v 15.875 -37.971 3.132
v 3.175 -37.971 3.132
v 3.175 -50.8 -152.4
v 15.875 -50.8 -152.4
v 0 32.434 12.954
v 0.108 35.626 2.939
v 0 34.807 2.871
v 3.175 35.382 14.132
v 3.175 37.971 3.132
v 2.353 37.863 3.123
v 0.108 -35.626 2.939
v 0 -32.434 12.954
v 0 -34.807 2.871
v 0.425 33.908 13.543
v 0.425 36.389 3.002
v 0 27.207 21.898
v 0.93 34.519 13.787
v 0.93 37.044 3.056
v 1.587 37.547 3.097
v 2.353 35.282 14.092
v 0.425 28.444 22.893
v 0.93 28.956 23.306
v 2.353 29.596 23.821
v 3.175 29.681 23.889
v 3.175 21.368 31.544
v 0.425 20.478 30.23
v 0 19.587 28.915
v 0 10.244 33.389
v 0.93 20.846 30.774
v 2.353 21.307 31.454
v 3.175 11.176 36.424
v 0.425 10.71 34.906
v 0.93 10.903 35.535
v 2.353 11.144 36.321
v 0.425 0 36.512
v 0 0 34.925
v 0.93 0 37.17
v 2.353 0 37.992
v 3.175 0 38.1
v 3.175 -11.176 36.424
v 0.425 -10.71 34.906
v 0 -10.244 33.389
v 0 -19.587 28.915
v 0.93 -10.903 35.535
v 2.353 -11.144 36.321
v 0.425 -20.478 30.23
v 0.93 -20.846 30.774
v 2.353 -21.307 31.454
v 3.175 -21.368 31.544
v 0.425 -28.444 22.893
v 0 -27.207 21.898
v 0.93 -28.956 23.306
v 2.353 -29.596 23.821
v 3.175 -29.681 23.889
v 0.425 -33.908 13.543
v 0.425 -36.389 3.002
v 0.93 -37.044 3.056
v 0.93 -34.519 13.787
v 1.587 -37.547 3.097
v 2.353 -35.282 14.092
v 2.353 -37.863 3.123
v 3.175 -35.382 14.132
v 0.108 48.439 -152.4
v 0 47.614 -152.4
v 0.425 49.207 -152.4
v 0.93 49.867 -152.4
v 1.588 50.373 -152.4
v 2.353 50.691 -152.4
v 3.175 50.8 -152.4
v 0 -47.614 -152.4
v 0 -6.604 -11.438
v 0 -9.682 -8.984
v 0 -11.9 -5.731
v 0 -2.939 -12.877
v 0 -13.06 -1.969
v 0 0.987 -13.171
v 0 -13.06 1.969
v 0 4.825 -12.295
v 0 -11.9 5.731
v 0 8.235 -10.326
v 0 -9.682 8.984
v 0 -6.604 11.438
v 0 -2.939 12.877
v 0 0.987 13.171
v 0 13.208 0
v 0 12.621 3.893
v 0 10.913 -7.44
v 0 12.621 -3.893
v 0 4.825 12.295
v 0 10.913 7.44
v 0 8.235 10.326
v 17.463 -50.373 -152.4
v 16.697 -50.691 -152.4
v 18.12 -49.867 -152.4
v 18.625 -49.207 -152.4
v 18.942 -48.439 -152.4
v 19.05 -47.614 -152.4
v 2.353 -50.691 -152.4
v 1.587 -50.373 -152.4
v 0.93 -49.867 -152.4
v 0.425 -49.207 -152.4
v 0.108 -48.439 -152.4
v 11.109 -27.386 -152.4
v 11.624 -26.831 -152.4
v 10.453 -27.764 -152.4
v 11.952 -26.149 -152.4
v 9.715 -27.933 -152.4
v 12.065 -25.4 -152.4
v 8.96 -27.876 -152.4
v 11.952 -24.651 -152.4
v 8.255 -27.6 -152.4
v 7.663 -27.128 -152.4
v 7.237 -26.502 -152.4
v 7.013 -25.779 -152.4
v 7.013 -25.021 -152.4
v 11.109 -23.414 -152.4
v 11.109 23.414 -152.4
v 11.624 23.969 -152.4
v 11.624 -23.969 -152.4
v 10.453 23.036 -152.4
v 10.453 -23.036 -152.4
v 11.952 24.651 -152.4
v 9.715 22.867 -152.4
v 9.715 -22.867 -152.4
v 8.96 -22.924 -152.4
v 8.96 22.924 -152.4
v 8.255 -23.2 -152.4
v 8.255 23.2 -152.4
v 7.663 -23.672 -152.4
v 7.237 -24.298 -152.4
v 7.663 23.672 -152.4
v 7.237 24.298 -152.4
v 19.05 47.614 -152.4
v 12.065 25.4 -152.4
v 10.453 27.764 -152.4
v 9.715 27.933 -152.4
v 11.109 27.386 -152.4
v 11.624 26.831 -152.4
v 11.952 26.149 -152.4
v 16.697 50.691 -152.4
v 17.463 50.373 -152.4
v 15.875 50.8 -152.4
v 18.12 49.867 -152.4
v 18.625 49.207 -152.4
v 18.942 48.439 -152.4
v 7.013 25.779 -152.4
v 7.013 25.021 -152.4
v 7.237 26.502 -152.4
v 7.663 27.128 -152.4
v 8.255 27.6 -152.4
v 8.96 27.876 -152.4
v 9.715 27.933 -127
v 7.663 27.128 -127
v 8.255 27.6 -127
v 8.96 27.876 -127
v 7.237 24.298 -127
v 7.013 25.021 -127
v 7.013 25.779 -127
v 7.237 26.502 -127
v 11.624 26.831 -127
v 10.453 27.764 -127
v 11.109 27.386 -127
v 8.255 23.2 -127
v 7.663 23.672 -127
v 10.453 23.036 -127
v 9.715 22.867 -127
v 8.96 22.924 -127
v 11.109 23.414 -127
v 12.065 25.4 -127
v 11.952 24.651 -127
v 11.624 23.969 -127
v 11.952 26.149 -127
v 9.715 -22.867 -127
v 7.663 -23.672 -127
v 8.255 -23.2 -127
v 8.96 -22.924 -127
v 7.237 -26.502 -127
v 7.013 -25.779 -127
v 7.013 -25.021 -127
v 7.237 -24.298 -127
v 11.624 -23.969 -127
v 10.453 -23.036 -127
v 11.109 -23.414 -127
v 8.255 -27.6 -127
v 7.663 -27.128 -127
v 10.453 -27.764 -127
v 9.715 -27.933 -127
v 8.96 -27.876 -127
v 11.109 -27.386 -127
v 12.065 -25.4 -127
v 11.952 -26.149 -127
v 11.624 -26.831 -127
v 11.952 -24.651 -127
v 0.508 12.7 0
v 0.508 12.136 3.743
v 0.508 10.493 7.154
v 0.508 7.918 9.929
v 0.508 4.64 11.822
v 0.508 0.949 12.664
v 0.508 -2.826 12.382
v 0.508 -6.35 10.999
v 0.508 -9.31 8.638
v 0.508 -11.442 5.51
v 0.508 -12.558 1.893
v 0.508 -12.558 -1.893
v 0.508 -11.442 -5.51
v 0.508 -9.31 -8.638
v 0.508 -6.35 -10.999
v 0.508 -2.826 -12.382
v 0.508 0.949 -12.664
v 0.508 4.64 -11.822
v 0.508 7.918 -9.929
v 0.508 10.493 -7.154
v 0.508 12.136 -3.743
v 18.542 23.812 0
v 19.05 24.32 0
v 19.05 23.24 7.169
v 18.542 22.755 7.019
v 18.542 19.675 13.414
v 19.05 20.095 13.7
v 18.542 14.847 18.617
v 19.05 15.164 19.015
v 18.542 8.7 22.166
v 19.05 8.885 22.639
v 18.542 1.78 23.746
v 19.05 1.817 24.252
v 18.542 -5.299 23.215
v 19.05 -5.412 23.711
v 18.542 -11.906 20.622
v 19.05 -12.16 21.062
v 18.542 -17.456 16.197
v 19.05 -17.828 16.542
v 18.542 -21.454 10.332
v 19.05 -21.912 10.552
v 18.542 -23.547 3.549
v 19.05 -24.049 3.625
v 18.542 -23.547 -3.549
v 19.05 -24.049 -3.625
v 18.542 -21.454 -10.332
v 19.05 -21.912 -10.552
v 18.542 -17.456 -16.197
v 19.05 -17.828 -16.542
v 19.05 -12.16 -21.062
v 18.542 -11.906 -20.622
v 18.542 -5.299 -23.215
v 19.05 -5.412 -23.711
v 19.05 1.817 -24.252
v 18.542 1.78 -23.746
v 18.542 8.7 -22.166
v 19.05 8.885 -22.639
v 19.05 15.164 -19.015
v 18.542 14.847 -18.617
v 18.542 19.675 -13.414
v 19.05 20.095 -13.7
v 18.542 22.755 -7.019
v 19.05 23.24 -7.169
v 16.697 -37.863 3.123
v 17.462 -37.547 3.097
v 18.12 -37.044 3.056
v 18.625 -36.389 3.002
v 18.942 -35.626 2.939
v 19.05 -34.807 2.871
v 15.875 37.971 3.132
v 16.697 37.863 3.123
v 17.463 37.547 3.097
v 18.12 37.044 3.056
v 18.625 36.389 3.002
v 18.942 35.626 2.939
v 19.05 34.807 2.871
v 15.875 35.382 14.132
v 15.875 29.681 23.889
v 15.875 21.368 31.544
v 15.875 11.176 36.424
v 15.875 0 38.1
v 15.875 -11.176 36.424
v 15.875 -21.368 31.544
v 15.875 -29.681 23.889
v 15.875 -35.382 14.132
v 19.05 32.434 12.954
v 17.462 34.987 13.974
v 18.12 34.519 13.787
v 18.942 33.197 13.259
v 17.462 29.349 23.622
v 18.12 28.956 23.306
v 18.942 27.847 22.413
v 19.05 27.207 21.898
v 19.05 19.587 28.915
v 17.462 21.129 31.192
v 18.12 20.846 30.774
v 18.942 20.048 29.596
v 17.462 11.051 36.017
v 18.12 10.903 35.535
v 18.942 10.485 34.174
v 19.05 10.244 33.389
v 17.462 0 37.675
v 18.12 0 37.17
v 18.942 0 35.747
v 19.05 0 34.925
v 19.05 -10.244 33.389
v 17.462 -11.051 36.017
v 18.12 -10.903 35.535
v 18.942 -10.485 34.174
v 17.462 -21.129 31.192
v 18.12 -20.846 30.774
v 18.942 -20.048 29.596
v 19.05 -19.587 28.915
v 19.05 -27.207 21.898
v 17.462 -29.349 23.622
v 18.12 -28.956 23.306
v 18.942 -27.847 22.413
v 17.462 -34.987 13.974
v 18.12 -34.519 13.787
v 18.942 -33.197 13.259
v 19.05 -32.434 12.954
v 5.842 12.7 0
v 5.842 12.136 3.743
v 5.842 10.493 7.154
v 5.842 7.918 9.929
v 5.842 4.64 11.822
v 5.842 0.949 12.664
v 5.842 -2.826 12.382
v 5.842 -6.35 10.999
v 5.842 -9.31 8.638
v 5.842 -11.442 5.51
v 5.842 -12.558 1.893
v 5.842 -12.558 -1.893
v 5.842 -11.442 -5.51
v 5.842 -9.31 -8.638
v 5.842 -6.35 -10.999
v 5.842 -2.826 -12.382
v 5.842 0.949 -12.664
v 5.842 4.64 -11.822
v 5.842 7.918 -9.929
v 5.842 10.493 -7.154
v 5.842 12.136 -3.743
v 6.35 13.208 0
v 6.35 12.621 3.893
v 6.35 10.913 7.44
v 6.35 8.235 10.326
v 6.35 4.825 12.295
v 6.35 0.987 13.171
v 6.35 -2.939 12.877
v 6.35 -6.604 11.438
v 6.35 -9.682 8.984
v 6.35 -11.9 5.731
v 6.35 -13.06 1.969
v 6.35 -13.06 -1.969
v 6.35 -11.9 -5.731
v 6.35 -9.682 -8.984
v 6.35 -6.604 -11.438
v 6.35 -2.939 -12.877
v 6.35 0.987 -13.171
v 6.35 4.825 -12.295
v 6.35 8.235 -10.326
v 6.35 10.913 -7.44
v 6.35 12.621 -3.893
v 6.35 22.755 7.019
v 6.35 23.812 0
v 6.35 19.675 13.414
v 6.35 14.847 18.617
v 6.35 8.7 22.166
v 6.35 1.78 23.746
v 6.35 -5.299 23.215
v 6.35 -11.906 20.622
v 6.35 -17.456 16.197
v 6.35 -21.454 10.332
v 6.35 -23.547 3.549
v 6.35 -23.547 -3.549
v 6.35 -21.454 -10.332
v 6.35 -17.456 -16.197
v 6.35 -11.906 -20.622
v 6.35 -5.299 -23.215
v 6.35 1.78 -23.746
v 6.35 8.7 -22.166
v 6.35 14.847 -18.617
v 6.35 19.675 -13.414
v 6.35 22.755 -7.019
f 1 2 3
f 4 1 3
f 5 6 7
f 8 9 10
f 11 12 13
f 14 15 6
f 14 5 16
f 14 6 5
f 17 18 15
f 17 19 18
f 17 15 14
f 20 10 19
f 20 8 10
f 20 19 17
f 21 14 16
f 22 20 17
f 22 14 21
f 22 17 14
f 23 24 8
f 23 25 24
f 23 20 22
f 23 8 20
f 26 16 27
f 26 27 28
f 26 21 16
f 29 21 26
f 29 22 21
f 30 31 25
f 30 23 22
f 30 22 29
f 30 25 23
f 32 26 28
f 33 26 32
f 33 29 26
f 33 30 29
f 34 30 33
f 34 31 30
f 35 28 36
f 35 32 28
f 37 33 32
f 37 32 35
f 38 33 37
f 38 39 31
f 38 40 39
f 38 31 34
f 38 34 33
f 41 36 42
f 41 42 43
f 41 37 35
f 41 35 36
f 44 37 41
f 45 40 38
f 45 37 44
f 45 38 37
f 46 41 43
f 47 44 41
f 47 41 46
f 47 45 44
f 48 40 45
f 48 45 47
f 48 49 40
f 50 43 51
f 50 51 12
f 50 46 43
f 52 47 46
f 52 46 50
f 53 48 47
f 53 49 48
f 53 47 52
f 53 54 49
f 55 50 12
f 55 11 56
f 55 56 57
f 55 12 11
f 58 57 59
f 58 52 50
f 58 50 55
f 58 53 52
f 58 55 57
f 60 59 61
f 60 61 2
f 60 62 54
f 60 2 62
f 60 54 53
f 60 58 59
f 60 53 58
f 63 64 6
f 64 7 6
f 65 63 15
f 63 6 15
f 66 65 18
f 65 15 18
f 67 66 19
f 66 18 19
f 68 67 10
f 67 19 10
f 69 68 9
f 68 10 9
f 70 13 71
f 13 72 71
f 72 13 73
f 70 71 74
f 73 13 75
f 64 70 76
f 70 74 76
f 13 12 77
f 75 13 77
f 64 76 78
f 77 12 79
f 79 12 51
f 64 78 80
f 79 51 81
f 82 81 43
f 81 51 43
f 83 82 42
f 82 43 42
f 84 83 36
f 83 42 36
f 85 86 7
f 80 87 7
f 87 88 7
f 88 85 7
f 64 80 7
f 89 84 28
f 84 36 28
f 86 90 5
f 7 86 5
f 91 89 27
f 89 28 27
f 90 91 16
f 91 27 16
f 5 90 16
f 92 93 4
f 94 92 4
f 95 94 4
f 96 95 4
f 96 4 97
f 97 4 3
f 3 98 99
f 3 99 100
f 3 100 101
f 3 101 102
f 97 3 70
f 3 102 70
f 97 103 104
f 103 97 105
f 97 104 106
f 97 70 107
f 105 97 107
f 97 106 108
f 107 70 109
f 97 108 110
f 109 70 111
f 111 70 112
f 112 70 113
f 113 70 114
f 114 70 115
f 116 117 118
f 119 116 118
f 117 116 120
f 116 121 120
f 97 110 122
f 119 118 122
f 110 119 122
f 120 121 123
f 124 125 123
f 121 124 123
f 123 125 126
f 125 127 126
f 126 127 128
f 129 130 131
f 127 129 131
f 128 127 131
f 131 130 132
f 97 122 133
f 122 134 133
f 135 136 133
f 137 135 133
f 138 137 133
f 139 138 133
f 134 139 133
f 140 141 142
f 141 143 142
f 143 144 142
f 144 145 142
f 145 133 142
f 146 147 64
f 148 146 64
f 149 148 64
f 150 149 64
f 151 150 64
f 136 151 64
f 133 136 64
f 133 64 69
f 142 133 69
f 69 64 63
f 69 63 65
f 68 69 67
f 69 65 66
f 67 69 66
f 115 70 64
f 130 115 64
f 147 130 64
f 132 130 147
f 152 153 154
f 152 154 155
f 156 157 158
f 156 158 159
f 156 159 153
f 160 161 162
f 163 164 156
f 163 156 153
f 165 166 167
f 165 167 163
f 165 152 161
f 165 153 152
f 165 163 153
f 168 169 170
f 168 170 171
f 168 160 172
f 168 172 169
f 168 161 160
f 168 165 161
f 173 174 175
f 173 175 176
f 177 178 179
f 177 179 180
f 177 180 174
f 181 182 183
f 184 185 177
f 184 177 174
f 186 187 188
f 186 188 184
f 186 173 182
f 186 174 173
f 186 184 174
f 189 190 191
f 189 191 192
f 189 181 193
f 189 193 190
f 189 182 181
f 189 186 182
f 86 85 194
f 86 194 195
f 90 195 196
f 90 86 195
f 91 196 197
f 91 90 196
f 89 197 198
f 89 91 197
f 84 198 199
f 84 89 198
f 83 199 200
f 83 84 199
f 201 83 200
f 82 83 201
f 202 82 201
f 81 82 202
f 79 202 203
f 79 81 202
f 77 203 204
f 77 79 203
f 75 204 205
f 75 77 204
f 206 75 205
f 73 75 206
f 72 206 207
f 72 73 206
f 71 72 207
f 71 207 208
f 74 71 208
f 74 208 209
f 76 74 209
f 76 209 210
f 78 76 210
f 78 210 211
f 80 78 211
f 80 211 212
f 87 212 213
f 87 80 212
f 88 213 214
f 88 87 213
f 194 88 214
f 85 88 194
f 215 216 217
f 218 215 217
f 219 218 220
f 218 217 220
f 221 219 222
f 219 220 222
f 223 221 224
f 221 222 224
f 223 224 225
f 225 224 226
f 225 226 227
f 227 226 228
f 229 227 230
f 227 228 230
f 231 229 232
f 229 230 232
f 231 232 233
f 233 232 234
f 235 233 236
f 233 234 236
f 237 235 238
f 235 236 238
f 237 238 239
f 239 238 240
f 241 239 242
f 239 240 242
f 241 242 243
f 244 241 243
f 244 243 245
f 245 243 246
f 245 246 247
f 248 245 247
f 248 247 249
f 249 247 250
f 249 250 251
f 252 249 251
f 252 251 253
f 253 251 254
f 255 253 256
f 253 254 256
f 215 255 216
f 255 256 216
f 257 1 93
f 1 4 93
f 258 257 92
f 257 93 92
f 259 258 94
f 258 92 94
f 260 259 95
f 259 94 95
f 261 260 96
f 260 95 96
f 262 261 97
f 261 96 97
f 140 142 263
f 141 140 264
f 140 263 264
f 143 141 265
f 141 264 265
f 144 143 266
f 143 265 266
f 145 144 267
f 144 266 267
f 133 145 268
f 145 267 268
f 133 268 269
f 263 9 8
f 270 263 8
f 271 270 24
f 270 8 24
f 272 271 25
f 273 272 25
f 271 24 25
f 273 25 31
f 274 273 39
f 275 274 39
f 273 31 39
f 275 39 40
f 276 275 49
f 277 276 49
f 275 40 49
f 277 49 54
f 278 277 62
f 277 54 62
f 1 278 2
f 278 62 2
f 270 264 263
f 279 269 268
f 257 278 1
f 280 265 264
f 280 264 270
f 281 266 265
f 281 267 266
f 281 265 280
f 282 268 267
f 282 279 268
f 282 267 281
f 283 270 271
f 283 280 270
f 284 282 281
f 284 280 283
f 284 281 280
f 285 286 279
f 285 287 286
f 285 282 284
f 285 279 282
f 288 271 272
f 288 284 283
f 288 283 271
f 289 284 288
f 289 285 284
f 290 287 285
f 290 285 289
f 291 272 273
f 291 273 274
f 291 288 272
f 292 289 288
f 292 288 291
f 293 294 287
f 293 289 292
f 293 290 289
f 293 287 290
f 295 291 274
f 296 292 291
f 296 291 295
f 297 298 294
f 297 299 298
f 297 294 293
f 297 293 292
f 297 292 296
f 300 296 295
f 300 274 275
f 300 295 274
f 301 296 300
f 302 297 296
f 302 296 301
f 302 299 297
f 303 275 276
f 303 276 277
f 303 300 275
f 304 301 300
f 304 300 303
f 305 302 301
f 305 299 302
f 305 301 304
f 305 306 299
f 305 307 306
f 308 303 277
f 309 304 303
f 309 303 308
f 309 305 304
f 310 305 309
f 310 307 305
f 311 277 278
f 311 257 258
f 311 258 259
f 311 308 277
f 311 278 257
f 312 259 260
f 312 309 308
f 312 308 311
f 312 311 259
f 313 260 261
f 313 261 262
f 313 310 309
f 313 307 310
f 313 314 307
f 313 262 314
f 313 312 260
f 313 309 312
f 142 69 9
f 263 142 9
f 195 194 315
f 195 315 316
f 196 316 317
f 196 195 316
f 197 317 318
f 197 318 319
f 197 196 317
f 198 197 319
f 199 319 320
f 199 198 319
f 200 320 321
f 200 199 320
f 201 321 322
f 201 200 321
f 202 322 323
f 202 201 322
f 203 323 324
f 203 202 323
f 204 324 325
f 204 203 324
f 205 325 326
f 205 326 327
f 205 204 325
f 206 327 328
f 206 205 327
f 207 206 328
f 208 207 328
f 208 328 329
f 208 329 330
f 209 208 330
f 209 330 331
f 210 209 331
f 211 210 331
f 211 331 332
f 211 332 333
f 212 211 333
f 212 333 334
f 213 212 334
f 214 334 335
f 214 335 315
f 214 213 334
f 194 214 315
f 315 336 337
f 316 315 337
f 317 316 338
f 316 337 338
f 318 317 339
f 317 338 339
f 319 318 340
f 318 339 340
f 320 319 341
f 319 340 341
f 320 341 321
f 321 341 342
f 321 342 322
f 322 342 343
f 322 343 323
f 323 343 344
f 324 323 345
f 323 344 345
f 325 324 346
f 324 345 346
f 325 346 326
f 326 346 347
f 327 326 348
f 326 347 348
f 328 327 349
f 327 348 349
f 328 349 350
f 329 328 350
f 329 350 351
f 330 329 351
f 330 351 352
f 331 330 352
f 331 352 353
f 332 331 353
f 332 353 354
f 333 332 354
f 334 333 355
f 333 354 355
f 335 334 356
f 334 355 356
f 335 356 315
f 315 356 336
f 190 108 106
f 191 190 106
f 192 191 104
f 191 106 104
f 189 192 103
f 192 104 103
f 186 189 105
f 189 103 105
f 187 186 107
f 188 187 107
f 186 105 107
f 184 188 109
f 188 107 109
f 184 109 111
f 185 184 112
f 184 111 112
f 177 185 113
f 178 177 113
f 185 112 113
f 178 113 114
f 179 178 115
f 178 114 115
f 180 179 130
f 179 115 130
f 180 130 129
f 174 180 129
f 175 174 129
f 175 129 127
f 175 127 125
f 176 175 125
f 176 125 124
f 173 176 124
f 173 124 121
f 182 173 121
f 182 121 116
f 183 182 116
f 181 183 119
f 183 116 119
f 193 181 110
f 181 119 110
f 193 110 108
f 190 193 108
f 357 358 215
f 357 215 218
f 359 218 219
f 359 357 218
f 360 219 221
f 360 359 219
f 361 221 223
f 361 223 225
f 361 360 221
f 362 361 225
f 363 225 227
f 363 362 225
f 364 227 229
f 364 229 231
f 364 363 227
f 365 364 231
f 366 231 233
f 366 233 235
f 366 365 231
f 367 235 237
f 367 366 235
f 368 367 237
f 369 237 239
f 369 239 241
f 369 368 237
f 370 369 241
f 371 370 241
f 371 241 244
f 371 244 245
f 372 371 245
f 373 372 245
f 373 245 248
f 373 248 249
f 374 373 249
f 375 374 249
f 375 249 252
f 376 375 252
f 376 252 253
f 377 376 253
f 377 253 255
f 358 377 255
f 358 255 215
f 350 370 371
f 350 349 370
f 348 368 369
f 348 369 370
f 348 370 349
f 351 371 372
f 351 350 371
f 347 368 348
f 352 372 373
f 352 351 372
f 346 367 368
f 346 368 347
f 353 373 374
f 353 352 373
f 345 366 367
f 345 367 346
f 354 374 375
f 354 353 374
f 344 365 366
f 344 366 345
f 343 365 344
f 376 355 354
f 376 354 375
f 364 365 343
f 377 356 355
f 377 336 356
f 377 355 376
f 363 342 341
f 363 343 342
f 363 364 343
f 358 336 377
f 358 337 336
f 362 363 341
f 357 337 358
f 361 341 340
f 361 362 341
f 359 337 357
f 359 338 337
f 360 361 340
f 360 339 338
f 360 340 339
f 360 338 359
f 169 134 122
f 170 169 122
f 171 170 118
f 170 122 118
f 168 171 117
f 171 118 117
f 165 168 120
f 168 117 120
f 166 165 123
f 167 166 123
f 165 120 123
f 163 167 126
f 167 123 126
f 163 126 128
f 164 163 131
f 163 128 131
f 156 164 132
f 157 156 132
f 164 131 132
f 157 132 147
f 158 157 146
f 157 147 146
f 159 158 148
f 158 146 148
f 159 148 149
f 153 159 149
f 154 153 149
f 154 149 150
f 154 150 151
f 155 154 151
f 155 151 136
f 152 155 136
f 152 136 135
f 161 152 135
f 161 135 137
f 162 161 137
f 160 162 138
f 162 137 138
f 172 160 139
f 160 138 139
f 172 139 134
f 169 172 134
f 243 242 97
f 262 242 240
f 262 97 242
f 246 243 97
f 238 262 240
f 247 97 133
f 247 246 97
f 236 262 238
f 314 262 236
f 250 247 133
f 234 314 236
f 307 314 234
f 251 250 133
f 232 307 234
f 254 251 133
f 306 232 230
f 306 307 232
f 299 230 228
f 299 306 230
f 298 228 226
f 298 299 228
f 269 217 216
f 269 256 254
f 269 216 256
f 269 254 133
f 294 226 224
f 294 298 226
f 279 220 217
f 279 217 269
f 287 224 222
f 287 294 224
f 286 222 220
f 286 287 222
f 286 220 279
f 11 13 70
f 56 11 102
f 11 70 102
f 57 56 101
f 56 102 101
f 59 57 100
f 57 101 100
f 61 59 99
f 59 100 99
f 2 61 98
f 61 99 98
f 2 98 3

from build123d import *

# Parameters (mm, degrees)
F0_R     = 23.8125
F1_DEPTH = 19.05
F0_R_2   = 12.7
F2_DEPTH = 6.35
F3_SIZE  = 0.508
F4_R     = 2.54
F5_DEPTH = 25.4
F6_R     = 3.175


with BuildPart() as f1:
    # F0 (on Right) → F1 (new body)
    with BuildSketch(Plane.YZ):
        with BuildLine():
            Line((50.8, -152.4), (37.971048, 3.132016))
            ThreePointArc((37.971048, 3.132016), (0, 38.1), (-37.971048, 3.132016))
            Line((-37.971048, 3.132016), (-50.8, -152.4))
            Line((-50.8, -152.4), (50.8, -152.4))
        make_face()
        Circle(F0_R, mode=Mode.SUBTRACT)
    extrude(amount=F1_DEPTH)

    # F0 (on Right) → F2 (join)
    with BuildSketch(Plane.YZ):
        Circle(F0_R)
        Circle(F0_R_2, mode=Mode.SUBTRACT)
    extrude(amount=F2_DEPTH)

    # F3
    f3_edges = [f1.edges().sort_by_distance(p)[0] for p in [
        (6.35, -12.7, 0),
        (19.05, -23.8125, 0),
        (0, -12.7, 0),
    ]]
    chamfer(f3_edges, length=F3_SIZE)

    # F4 (on face) → F5 (cut)
    with BuildSketch(Plane(origin=(0, 0, -152.4), x_dir=(1, 0, 0), z_dir=(0, 0, -1))):
        with Locations((9.525, 25.4)):
            Circle(F4_R)
        with Locations((9.525, -25.4)):
            Circle(F4_R)
    extrude(amount=-F5_DEPTH, mode=Mode.SUBTRACT)

    # F6
    f6_edges = [f1.edges().sort_by_distance(p)[0] for p in [
        (19.05, -44.385524, -74.633992),
        (0, -44.385524, -74.633992),
    ]]
    fillet(f6_edges, radius=F6_R)


solid = f1.part
